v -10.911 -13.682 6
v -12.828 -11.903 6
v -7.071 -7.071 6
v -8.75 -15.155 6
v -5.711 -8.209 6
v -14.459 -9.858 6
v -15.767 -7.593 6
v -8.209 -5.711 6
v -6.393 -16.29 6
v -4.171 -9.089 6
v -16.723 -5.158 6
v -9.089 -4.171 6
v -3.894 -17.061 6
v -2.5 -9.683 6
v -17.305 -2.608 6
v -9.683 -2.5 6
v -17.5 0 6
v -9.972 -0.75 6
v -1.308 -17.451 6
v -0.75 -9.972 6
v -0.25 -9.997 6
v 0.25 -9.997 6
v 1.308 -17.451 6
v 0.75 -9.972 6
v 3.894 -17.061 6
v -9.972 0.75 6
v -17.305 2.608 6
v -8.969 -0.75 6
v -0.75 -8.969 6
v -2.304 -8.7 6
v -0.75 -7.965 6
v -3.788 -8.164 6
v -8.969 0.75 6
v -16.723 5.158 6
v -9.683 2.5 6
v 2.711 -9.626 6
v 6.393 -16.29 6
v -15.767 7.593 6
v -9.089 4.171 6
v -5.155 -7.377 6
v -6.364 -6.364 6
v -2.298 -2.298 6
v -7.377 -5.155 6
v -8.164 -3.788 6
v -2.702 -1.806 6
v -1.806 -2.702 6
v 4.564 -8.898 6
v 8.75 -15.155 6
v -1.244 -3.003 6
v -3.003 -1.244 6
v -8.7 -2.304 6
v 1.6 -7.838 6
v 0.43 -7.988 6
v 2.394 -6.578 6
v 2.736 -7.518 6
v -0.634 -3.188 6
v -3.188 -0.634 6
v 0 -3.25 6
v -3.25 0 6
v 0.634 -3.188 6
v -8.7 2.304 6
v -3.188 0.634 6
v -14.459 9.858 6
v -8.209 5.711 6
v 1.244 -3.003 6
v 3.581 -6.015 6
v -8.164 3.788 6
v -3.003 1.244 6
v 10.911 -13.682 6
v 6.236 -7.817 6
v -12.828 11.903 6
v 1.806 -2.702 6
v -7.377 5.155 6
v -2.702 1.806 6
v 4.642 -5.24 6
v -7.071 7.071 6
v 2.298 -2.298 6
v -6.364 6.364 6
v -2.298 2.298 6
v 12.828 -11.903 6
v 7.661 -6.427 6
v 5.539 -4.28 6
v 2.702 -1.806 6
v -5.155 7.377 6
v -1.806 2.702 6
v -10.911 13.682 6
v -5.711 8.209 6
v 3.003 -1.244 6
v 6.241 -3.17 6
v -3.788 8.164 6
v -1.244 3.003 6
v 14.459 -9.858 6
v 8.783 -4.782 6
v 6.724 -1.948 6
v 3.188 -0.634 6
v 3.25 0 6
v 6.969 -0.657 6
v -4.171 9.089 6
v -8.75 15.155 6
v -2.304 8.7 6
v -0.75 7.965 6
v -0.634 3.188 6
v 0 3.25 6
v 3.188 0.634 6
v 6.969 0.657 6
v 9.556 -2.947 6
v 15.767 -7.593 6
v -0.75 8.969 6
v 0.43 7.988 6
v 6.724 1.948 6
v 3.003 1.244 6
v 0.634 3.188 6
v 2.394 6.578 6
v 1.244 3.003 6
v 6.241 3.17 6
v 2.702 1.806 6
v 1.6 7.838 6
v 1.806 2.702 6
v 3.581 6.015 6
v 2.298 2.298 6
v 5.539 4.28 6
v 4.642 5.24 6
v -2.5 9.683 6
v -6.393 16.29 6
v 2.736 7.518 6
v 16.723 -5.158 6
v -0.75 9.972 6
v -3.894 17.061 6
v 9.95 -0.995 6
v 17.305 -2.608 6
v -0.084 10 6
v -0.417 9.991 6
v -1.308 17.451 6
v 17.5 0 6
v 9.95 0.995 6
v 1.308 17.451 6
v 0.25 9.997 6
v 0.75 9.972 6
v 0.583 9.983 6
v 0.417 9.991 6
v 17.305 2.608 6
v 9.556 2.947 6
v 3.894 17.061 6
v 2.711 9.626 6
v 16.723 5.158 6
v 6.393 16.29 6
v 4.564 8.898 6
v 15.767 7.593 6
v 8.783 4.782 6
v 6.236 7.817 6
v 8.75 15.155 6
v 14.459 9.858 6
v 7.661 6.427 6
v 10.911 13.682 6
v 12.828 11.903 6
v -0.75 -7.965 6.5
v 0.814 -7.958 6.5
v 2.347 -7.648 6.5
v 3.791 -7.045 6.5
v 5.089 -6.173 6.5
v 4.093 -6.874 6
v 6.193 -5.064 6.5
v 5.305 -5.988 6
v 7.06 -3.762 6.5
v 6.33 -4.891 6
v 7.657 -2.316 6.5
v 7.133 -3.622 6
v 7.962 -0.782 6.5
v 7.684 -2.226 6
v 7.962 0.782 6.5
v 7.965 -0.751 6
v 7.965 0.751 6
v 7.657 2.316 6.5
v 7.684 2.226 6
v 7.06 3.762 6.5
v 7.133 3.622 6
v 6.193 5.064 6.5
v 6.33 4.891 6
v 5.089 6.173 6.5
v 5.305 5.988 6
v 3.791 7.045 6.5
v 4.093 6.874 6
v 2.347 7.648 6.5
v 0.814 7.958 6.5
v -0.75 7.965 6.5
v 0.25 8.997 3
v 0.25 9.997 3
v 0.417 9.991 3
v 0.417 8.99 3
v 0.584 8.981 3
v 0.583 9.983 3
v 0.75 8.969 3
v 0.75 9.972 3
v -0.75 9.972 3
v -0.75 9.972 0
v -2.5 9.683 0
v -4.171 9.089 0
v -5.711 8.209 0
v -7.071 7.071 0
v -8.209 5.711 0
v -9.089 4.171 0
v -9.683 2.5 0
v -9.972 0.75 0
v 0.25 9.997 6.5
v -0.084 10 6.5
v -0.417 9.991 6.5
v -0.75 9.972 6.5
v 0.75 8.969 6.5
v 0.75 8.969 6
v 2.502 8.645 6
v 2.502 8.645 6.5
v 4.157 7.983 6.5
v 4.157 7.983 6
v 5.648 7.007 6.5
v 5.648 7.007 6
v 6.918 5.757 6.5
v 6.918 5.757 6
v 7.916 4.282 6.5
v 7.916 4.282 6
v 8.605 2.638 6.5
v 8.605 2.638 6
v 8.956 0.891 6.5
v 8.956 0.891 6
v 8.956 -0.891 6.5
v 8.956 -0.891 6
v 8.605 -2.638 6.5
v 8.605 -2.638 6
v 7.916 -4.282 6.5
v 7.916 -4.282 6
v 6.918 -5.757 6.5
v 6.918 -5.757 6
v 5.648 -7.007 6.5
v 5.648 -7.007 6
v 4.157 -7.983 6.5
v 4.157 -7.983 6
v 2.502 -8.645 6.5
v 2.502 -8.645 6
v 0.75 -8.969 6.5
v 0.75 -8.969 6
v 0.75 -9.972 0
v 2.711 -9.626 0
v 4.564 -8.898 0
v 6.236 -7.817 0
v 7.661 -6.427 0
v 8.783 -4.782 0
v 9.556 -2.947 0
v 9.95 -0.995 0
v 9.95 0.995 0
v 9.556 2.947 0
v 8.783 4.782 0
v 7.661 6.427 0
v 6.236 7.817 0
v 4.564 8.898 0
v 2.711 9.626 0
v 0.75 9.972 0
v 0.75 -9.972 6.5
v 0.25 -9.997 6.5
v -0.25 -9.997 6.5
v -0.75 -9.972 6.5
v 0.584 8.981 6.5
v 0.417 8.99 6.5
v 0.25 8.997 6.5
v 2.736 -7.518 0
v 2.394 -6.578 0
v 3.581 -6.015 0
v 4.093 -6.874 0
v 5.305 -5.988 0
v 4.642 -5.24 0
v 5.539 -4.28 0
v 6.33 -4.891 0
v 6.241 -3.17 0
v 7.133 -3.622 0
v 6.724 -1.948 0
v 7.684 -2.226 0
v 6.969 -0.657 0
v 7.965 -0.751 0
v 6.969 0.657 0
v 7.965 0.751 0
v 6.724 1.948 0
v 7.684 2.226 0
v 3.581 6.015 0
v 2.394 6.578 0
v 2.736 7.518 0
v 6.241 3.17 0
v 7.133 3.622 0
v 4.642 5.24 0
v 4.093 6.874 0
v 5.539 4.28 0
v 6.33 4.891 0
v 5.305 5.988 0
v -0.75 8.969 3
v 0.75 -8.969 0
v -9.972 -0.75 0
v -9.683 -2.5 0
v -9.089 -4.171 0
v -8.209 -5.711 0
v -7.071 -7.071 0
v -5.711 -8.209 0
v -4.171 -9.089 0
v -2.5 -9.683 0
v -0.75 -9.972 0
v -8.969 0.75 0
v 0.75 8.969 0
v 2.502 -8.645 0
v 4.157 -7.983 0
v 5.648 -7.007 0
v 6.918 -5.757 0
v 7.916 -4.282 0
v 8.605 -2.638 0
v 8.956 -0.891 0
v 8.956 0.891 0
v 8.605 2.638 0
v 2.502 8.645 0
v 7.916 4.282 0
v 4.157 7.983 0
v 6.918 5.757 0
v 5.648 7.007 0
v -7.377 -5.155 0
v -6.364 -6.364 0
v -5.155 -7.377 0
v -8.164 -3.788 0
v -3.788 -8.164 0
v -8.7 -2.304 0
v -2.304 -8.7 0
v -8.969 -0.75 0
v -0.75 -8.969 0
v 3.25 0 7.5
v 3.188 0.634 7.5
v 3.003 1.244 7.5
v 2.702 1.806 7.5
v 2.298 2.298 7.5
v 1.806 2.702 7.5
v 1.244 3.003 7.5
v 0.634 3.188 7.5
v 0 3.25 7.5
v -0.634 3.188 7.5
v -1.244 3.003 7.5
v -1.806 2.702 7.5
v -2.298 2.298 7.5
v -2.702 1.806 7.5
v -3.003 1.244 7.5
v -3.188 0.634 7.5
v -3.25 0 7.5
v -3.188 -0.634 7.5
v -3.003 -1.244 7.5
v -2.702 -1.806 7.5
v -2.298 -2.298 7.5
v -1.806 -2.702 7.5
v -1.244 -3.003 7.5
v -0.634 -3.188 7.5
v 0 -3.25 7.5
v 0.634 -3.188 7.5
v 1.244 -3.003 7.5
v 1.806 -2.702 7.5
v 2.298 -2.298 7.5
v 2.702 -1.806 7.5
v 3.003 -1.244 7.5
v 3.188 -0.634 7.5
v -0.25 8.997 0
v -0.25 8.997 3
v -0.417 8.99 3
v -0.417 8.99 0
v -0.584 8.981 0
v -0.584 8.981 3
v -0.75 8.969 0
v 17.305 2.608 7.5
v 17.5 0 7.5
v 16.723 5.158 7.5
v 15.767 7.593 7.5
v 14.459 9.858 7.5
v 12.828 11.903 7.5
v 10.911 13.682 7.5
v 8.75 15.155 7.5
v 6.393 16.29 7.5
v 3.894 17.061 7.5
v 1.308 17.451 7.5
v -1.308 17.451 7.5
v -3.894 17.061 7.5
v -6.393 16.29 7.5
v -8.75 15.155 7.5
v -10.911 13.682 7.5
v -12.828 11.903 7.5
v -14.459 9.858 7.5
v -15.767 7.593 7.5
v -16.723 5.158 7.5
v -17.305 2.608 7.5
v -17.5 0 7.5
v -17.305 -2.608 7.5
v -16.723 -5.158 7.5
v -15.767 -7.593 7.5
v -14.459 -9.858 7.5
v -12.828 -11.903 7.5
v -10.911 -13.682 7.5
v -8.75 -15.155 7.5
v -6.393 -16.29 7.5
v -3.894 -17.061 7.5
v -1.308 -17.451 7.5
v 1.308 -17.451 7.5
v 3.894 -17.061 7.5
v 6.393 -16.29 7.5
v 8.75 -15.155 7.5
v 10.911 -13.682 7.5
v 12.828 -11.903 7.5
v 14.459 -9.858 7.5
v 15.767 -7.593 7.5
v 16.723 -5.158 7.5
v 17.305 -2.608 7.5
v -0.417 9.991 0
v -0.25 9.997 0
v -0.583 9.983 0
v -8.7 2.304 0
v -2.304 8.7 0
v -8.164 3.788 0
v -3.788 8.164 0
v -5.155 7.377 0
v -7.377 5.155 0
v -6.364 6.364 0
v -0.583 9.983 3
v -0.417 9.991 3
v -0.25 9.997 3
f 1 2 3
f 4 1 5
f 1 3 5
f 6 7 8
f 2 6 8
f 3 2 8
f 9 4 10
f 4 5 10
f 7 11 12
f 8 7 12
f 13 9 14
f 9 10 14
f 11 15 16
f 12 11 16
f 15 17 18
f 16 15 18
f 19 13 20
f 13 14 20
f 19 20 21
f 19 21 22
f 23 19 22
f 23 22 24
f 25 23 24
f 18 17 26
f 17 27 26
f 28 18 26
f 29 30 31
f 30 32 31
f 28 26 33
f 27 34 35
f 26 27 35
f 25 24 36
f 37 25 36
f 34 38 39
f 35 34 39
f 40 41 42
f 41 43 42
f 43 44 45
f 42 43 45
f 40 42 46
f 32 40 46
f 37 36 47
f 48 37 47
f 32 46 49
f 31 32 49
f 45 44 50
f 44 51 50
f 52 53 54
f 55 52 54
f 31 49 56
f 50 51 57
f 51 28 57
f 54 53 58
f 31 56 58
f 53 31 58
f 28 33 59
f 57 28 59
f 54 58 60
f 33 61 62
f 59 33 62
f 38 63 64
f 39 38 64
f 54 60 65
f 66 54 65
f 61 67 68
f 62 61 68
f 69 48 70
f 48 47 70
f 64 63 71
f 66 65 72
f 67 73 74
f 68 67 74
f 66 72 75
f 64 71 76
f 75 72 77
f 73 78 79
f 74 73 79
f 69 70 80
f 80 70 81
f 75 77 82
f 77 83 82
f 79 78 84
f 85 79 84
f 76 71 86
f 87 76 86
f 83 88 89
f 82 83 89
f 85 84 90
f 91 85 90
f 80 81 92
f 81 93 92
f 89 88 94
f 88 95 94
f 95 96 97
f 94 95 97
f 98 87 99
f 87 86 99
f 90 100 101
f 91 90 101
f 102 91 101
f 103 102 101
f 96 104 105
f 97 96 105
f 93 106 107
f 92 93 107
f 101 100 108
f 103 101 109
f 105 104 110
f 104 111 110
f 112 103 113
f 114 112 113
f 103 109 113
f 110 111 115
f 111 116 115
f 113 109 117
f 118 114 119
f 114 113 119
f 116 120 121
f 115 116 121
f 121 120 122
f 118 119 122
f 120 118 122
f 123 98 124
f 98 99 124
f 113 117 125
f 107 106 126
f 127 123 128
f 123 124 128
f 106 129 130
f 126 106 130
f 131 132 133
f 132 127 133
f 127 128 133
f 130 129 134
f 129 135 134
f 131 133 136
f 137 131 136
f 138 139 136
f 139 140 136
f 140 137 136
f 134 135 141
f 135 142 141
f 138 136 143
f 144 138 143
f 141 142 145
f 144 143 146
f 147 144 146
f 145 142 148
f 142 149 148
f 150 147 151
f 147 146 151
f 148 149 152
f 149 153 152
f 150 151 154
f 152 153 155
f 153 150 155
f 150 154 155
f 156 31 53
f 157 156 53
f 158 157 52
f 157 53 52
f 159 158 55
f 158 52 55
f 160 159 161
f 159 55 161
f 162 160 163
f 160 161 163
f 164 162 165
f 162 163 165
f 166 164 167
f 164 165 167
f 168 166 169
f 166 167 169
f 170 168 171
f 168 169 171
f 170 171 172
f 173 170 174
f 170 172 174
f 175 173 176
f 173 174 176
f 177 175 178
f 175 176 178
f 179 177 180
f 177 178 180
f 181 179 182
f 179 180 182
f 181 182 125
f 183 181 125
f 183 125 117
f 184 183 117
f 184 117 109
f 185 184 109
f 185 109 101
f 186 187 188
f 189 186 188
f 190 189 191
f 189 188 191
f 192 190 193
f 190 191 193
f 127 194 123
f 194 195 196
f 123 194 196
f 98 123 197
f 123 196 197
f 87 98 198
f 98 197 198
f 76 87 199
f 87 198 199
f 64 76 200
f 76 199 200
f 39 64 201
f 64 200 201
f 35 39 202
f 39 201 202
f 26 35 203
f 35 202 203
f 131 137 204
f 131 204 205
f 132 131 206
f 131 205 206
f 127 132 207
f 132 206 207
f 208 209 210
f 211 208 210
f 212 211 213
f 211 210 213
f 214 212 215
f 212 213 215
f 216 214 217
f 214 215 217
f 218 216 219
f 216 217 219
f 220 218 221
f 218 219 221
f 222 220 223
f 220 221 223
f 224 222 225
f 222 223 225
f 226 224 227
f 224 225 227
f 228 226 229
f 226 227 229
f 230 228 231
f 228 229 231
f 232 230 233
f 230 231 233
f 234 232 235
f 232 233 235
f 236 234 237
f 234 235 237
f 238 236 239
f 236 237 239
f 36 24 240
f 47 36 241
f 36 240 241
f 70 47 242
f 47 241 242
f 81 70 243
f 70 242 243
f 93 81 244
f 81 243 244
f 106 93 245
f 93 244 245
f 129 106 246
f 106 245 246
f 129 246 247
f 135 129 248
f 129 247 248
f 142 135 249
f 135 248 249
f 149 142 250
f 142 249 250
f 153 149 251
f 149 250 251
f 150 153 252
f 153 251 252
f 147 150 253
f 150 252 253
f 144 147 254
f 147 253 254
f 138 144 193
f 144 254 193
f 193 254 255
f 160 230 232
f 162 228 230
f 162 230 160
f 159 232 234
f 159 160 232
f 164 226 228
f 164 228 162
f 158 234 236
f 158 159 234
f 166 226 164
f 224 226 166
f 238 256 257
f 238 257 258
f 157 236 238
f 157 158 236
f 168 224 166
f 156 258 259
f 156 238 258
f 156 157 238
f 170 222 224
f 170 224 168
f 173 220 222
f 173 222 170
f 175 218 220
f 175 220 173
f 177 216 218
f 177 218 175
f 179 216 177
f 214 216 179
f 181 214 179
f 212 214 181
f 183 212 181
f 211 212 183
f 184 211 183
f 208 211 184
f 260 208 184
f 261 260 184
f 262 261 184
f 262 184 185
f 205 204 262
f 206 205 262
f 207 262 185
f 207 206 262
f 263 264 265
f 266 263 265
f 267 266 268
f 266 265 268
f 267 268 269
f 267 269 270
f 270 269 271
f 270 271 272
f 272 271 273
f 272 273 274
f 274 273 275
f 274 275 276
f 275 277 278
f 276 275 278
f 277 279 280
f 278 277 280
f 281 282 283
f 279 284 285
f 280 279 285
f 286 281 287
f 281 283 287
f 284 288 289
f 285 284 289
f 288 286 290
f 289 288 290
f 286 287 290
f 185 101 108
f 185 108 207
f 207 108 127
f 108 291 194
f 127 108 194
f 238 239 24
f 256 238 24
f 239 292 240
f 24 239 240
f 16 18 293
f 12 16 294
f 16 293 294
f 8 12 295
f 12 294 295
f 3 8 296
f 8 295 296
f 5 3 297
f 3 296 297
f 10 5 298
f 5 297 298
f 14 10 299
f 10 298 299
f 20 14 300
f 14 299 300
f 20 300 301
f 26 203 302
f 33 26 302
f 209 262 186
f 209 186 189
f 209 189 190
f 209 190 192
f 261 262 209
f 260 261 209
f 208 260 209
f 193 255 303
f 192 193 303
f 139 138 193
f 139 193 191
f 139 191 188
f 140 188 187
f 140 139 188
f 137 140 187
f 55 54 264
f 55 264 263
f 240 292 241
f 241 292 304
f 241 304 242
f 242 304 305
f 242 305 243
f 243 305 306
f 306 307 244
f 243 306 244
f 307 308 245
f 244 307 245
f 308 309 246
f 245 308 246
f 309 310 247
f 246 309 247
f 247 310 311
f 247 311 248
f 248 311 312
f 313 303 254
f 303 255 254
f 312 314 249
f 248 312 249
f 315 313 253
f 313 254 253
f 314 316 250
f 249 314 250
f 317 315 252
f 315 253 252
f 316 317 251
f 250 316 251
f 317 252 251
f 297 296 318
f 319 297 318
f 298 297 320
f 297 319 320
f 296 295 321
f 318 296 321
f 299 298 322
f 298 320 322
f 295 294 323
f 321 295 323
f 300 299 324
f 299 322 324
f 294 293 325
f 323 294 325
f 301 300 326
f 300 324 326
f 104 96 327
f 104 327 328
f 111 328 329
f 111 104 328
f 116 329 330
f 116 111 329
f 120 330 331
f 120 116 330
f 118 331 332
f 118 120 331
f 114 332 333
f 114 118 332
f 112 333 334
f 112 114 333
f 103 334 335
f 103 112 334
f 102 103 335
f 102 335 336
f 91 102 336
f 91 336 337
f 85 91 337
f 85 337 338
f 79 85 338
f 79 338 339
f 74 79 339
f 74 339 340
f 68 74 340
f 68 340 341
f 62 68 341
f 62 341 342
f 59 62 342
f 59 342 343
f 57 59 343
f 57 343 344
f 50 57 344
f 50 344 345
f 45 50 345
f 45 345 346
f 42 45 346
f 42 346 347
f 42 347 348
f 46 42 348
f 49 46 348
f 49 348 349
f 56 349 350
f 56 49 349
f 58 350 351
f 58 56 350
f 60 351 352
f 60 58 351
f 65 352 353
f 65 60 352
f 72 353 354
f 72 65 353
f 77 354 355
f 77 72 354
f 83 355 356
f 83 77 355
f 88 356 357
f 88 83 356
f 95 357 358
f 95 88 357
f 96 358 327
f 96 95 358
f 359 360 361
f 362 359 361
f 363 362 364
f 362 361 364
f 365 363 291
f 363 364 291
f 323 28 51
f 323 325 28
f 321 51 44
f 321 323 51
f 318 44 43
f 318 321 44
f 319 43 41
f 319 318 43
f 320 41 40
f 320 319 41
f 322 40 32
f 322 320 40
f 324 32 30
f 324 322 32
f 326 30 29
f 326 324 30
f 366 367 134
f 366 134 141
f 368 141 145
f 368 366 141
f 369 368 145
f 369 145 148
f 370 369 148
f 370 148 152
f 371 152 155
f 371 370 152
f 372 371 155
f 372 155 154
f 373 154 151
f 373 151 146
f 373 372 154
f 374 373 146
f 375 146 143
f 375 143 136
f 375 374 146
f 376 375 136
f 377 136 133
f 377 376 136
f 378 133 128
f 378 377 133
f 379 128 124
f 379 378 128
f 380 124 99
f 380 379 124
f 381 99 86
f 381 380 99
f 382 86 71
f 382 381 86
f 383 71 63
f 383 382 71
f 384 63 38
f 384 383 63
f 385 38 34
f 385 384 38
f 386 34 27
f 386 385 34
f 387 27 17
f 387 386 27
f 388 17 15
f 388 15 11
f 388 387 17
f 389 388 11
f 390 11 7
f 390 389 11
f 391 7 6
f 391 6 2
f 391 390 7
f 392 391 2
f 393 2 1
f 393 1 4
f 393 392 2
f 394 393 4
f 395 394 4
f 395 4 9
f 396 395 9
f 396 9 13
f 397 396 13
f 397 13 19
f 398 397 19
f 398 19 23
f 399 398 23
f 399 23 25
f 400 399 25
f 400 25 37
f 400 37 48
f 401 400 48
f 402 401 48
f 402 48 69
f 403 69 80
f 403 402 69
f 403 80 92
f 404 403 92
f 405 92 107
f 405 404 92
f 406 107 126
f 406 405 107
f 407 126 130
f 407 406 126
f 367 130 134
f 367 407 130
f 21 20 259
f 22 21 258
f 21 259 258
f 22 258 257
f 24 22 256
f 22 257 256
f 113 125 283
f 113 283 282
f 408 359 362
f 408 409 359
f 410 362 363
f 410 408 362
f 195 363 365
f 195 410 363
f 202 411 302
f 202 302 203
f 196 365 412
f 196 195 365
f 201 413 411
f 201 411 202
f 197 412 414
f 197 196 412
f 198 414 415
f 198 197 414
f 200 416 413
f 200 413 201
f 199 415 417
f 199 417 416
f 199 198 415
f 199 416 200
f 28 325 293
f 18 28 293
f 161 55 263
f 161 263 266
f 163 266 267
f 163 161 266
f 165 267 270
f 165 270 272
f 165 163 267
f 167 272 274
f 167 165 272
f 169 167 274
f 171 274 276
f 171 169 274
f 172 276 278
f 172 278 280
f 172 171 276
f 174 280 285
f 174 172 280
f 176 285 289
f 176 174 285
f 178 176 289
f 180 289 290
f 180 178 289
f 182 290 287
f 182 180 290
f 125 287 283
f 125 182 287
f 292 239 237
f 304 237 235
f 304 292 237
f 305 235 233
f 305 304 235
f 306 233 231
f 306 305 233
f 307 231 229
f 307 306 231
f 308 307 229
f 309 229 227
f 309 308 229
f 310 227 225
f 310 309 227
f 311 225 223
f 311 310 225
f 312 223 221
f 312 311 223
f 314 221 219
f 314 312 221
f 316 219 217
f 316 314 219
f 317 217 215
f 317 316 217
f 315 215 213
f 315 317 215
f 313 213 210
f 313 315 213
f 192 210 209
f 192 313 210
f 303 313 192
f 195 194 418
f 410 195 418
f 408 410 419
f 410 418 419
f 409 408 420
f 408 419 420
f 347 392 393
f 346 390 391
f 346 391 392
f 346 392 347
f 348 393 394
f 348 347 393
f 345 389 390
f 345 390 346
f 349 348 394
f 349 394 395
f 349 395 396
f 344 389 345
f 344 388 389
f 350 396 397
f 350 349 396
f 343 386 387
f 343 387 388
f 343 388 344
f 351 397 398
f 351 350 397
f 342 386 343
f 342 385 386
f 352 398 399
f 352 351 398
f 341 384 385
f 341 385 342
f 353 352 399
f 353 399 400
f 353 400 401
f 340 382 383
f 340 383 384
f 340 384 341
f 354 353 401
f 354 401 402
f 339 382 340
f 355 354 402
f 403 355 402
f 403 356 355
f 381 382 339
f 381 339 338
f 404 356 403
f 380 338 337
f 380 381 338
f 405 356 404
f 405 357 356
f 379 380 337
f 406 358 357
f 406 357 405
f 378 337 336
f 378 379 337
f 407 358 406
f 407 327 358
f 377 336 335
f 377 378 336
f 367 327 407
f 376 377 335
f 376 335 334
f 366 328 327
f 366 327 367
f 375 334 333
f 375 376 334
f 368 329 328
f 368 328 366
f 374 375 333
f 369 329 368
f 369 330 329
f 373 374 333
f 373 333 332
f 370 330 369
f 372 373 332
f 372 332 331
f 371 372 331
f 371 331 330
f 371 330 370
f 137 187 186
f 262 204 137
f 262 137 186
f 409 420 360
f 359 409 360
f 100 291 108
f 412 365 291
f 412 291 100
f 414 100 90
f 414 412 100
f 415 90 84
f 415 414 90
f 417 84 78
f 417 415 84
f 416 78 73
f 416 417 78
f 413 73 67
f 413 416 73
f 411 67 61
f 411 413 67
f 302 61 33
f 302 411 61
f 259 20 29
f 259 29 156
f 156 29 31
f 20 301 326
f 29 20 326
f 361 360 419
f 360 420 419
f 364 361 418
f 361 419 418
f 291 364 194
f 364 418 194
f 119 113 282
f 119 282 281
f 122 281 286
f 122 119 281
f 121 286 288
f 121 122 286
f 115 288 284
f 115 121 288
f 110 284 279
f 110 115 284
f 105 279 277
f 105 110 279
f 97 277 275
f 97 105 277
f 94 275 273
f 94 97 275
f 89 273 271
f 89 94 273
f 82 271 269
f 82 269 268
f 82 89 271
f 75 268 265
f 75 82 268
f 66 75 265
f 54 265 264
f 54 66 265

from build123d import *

# Parameters (mm, degrees)
SKETCH1_R           = 10
SKETCH1_R_2         = 3.25
BOSS_EXTRUDE1_DEPTH = 7.5
SKETCH2_R           = 9
CUT_EXTRUDE1_DEPTH  = 6
CUT_EXTRUDE2_DEPTH  = 6
CIRPATTERN1_COUNT   = 3
CIRPATTERN1_ANGLE   = 180
BOSS_EXTRUDE2_DEPTH = 6
CUT_EXTRUDE3_DEPTH  = 0.5
BOSS_EXTRUDE3_DEPTH = 3.5
BOSS_EXTRUDE4_DEPTH = 3
SKETCH8_R           = 17.5
SKETCH8_R_2         = 10
BOSS_EXTRUDE5_DEPTH = 1.5


with BuildPart() as part:
    # Sketch1 → Boss-Extrude1 (new body)
    with BuildSketch(Plane.XY):
        Circle(SKETCH1_R)
        Circle(SKETCH1_R_2, mode=Mode.SUBTRACT)
    extrude(amount=BOSS_EXTRUDE1_DEPTH)

    # Sketch2 → Cut-Extrude1 (cut)
    with BuildSketch(Plane.XY):
        Circle(SKETCH2_R)
    extrude(amount=CUT_EXTRUDE1_DEPTH, mode=Mode.SUBTRACT)

    # Sketch3 → Cut-Extrude2 (cut)
    with BuildSketch(Plane(origin=(0, 0, 0), x_dir=(-1, 0, 0), z_dir=(0, 0, -1))):
        with BuildLine():
            Line((0.75, -9.971835338), (0.75, -8.968695557))
            ThreePointArc((0.75, -8.968695557), (0, -9), (-0.75, -8.968695557))
            Line((-0.75, -8.968695557), (-0.75, -9.971835338))
            ThreePointArc((-0.75, -9.971835338), (0, -10), (0.75, -9.971835338))
        make_face()
    cut_extrude2 = extrude(amount=-CUT_EXTRUDE2_DEPTH, mode=Mode.SUBTRACT)

    # CirPattern1: Cut-Extrude2 ×3 about axis
    cirpattern1_axis = Axis((0, 0, 0), (0, 0, -1))
    for i in range(1, CIRPATTERN1_COUNT):
        add(cut_extrude2.rotate(cirpattern1_axis, i * CIRPATTERN1_ANGLE / (CIRPATTERN1_COUNT - 1)), mode=Mode.SUBTRACT)

    # Sketch4 → Boss-Extrude2 (add)
    with BuildSketch(Plane(origin=(0, 0, 6), x_dir=(-1, 0, 0), z_dir=(0, 0, -1))):
        with BuildLine():
            Line((-2.736161147, 7.517540966), (-2.394141003, 6.577848346))
            ThreePointArc((-2.394141003, 6.577848346), (-7, 0), (-2.394141003, -6.577848346))
            Line((-2.394141003, -6.577848346), (-2.736161147, -7.517540966))
            ThreePointArc((-2.736161147, -7.517540966), (-8, 0), (-2.736161147, 7.517540966))
        make_face()
    extrude(amount=BOSS_EXTRUDE2_DEPTH)

    # Sketch5 → Cut-Extrude3 (cut)
    with BuildSketch(Plane(origin=(0, 0, 6), x_dir=(-1, 0, 0), z_dir=(0, 0, -1))):
        with BuildLine():
            Line((-0.75, -8.968695557), (-0.75, -9.971835338))
            ThreePointArc((-0.75, -9.971835338), (0, -10), (0.75, -9.971835338))
            Line((0.75, -9.971835338), (0.75, -7.964766161))
            ThreePointArc((0.75, -7.964766161), (-8, 0), (0.75, 7.964766161))
            Line((0.75, 7.964766161), (0.75, 9.971835338))
            ThreePointArc((0.75, 9.971835338), (0, 10), (-0.75, 9.971835338))
            Line((-0.75, 9.971835338), (-0.75, 8.968695557))
            ThreePointArc((-0.75, 8.968695557), (-9, 0), (-0.75, -8.968695557))
        make_face()
    extrude(amount=-CUT_EXTRUDE3_DEPTH, mode=Mode.SUBTRACT)

    # Sketch6 → Boss-Extrude3 (add)
    with BuildSketch(Plane(origin=(0, 0, 6.5), x_dir=(-1, 0, 0), z_dir=(0, 0, -1))):
        with BuildLine():
            Line((-0.75, 8.968695557), (-0.75, 9.971835338))
            ThreePointArc((-0.75, 9.971835338), (-0.500156715, 9.987484331), (-0.25, 9.996874512))
            Line((-0.25, 9.996874512), (-0.25, 8.996527108))
            ThreePointArc((-0.25, 8.996527108), (-0.500193611, 8.986089603), (-0.75, 8.968695557))
        make_face()
    extrude(amount=BOSS_EXTRUDE3_DEPTH)

    # Sketch7 → Boss-Extrude4 (add)
    with BuildSketch(Plane(origin=(0, 0, 3), x_dir=(-1, 0, 0), z_dir=(0, 0, -1))):
        with BuildLine():
            ThreePointArc((0.25, 8.996527108), (0.500193611, 8.986089603), (0.75, 8.968695557))
            Line((0.75, 8.968695557), (0.75, 9.971835338))
            ThreePointArc((0.75, 9.971835338), (0.500156715, 9.987484331), (0.25, 9.996874512))
            Line((0.25, 9.996874512), (0.25, 8.996527108))
        make_face()
    extrude(amount=BOSS_EXTRUDE4_DEPTH)

    # Sketch8 → Boss-Extrude5 (add)
    with BuildSketch(Plane.XY.offset(7.5)):
        Circle(SKETCH8_R)
        Circle(SKETCH8_R_2, mode=Mode.SUBTRACT)
    extrude(amount=-BOSS_EXTRUDE5_DEPTH)


solid = part.part
